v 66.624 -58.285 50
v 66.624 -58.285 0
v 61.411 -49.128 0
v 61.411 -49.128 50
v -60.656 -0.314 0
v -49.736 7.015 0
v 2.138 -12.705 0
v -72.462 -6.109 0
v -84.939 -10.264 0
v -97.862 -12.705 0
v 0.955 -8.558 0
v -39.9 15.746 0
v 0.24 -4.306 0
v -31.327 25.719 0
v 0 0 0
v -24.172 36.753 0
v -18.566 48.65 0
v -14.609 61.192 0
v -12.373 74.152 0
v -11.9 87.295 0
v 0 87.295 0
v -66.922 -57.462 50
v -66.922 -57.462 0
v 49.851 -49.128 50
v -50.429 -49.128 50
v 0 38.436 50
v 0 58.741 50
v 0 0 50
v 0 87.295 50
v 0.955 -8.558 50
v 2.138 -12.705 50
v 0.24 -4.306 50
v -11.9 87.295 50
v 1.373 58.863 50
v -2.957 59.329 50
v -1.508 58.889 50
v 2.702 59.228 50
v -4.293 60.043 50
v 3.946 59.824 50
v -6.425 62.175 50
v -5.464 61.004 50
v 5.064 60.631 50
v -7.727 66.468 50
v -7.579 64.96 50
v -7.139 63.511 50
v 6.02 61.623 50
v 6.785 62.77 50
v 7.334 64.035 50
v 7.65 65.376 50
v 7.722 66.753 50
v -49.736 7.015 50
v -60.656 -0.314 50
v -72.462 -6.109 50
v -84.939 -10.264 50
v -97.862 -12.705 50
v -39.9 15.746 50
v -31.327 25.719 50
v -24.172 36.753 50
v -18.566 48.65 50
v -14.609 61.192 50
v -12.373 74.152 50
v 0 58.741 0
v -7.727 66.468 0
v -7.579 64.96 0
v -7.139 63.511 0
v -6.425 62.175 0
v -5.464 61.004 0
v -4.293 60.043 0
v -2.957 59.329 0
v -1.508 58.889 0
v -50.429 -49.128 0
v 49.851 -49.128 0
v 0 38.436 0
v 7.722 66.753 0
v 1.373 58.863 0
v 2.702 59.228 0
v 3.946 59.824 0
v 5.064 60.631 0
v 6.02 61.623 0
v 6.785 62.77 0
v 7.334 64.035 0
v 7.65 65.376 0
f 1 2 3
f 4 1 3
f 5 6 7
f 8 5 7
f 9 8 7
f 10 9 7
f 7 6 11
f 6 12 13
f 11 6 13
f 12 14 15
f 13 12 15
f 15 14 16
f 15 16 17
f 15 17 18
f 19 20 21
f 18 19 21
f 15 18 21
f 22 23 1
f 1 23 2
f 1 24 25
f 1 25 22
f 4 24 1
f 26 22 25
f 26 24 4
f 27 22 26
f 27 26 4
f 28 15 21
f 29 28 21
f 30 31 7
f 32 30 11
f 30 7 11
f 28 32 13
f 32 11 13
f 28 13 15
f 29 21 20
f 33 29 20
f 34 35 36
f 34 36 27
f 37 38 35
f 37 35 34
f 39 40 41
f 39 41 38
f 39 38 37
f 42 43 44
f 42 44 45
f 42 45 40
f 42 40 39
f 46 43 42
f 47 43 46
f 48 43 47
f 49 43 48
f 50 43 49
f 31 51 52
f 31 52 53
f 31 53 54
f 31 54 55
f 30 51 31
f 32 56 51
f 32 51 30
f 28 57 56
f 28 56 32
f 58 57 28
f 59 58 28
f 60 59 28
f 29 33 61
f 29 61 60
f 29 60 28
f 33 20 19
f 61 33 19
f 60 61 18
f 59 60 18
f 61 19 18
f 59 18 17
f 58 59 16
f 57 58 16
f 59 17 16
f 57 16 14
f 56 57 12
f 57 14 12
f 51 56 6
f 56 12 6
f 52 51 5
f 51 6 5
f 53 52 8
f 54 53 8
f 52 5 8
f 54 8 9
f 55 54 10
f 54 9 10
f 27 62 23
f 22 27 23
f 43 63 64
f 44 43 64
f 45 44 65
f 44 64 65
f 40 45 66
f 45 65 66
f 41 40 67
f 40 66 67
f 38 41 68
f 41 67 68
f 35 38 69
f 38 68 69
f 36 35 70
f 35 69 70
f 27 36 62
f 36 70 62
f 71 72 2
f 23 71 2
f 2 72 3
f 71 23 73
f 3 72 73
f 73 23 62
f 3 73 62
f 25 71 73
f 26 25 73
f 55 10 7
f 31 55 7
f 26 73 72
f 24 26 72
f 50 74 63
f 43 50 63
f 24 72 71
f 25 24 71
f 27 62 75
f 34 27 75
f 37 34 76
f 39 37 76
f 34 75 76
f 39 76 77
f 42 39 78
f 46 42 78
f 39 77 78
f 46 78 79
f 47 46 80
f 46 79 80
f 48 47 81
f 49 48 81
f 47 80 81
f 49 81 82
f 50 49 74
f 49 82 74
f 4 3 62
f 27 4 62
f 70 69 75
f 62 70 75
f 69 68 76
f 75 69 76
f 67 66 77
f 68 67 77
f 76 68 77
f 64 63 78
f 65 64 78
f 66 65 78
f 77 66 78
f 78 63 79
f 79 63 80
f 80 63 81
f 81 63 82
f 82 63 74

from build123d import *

# Parameters (mm, degrees)
F1_DEPTH = 50
F3_DEPTH = 50


with BuildPart() as f1:
    # F0 (on Top) → F1 (new body)
    with BuildSketch(Plane.XY):
        with BuildLine():
            Line((0, 0), (0, 87.294715))
            Line((0, 87.294715), (-11.90007, 87.294715))
            ThreePointArc((-11.90007, 87.294715), (-35.445624, 20.587596), (-97.862103, -12.705285))
            Line((-97.862103, -12.705285), (2.137897, -12.705285))
            ThreePointArc((2.137897, -12.705285), (0.538205, -6.44195), (0, 0))
        make_face()
    extrude(amount=F1_DEPTH)


with BuildPart() as f3:
    # F2 (on Top) → F3 (new body)
    with BuildSketch(Plane.XY):
        Polygon((66.623631, -58.285341), (61.410546, -49.128443), (0, 58.740522), (-66.922144, -57.462403), align=None)
        Polygon((49.850918, -49.128443), (-50.428901, -49.128443), (0, 38.435783), align=None, mode=Mode.SUBTRACT)
        with BuildLine():
            ThreePointArc((-7.727374, 66.467896), (-5.464079, 61.003818), (0, 58.740522))
            ThreePointArc((0, 58.740522), (5.564018, 61.10562), (7.722107, 66.753154))
            Line((7.722107, 66.753154), (-7.727374, 66.467896))
        make_face()
    extrude(amount=F3_DEPTH)


solid = Compound([f1.part, f3.part])
